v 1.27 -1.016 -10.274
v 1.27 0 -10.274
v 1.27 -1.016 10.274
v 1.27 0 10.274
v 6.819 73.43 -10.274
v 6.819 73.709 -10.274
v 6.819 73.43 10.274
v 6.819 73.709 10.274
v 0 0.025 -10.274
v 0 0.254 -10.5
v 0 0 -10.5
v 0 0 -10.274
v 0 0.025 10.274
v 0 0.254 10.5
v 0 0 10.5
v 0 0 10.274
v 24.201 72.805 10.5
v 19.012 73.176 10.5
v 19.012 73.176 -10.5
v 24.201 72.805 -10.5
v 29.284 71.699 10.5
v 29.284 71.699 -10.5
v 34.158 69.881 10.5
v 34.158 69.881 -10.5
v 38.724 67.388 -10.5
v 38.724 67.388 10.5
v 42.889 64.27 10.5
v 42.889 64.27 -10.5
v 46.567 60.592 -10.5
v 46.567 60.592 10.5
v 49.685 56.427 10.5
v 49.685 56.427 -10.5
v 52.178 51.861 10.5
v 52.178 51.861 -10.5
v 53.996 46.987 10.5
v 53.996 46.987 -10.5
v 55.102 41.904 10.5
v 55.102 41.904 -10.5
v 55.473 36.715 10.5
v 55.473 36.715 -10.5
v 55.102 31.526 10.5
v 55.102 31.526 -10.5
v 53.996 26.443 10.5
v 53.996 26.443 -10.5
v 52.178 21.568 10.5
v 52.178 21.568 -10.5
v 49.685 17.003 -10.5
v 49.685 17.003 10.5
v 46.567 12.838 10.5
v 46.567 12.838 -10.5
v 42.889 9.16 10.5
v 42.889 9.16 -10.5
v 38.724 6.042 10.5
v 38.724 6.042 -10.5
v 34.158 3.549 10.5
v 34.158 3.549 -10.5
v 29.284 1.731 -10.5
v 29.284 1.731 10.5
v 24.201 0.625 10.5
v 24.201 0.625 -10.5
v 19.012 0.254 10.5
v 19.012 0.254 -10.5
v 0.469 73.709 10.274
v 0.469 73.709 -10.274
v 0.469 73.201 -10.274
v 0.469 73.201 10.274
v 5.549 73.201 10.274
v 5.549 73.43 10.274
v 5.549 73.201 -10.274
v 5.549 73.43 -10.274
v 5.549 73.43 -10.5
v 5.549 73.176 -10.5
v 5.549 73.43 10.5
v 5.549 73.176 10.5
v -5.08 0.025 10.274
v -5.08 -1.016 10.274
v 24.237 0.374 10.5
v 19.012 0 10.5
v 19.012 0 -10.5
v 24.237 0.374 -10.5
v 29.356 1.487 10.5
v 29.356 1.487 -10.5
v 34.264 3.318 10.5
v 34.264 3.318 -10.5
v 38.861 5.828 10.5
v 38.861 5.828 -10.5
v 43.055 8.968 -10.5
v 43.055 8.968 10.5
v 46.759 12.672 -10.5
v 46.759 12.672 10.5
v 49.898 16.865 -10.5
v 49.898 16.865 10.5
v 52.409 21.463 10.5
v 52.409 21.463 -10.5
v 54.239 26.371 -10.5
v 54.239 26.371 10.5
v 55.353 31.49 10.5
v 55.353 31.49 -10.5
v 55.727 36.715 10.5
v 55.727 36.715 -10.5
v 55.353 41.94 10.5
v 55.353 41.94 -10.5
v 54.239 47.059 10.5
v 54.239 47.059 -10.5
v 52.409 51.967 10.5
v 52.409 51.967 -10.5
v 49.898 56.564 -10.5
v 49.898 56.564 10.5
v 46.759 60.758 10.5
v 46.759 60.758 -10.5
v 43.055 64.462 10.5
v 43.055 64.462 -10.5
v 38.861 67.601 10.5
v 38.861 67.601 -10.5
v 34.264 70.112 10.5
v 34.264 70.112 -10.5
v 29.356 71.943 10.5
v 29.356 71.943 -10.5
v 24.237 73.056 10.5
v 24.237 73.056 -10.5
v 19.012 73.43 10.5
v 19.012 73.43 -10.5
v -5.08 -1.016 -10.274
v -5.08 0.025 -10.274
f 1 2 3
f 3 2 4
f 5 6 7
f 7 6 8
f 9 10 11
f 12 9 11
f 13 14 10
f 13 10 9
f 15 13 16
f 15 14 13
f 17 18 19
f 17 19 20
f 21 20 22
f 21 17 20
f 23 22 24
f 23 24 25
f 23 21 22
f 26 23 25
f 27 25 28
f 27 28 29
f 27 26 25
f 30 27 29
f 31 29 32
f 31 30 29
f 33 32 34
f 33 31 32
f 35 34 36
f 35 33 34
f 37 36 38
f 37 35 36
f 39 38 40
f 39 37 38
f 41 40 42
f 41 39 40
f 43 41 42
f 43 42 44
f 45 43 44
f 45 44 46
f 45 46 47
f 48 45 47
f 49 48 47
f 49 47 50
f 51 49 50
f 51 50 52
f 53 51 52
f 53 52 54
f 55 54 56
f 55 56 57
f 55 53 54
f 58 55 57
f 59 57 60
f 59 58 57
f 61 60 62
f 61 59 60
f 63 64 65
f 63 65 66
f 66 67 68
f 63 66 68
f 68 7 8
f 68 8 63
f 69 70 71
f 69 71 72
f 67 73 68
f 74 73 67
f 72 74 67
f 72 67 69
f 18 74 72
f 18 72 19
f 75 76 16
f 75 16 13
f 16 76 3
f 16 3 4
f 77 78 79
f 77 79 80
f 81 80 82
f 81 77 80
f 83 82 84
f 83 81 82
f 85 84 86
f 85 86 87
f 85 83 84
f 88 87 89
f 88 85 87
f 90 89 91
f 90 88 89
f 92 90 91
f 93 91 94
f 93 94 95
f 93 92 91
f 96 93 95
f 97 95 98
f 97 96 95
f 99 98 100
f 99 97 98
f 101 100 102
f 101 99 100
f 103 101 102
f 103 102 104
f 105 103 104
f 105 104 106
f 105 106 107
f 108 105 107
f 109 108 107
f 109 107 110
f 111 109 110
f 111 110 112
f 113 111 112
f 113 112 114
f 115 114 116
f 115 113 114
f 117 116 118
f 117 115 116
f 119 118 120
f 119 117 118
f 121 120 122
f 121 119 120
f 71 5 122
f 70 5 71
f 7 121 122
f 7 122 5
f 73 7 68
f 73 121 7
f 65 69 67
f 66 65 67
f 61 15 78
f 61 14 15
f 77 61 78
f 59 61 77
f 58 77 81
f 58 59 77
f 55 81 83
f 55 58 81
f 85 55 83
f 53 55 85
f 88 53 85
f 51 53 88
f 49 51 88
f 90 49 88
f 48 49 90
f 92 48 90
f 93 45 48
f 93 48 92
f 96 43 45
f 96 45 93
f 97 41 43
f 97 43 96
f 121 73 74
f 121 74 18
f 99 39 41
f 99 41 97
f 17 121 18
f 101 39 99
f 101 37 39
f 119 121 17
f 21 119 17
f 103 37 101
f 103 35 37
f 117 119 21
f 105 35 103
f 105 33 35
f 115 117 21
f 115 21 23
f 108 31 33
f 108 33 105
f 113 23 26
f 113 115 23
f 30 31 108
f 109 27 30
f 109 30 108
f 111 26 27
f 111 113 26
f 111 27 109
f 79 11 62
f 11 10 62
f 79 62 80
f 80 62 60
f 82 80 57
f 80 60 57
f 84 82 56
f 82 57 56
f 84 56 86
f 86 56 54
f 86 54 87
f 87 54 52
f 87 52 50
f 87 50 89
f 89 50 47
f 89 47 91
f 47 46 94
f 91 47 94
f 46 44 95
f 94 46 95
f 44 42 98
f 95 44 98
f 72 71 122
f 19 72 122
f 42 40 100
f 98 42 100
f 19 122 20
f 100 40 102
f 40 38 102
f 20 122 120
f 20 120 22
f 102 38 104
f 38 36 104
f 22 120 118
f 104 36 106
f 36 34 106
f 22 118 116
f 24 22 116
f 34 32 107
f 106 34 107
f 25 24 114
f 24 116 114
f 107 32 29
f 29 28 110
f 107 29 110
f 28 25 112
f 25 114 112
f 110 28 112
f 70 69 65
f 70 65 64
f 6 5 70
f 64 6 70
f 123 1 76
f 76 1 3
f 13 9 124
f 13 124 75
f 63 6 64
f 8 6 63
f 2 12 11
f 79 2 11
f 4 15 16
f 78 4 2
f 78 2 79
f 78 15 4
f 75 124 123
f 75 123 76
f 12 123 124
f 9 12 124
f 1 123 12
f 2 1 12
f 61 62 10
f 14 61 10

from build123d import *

# Parameters (mm, degrees)
BOSS_EXTRUDE1_DEPTH      = 10.5
BOSS_EXTRUDE2_DEPTH      = 5.08
BOSS_EXTRUDE2_DEPTH_BACK = 1.27
SKETCH3_W                = 20.5486
SKETCH3_H                = 1.0414
BOSS_EXTRUDE3_DEPTH      = 5.08
BOSS_EXTRUDE3_DEPTH_BACK = 1.27
SKETCH4_W                = 20.5486
SKETCH4_H                = 0.508


with BuildPart() as part:
    # Sketch1 → Boss-Extrude1 (new, symmetric)
    with BuildSketch(Plane.XY):
        with BuildLine():
            Line((0, 0), (19.01175011, 0))
            ThreePointArc((19.01175011, 0), (55.726625118, 36.714875008), (19.01175011, 73.429750016))
            Line((19.01175011, 73.429750016), (5.549000018, 73.429750016))
            Line((5.549000018, 73.429750016), (5.549000018, 73.175750016))
            Line((5.549000018, 73.175750016), (19.01175011, 73.175750016))
            ThreePointArc((19.01175011, 73.175750016), (55.472625118, 36.714875008), (19.01175011, 0.254))
            Line((19.01175011, 0.254), (0, 0.254))
            Line((0, 0.254), (0, 0))
        make_face()
    extrude(amount=BOSS_EXTRUDE1_DEPTH, both=True)

    # Sketch3 → Boss-Extrude2 (add, two sides: drawn at the far end of the back side and taken through both)
    with BuildSketch(Plane.ZY.offset(-BOSS_EXTRUDE2_DEPTH_BACK)):
        with Locations((0, -0.4953)):
            Rectangle(SKETCH3_W, SKETCH3_H)
    extrude(amount=BOSS_EXTRUDE2_DEPTH + BOSS_EXTRUDE2_DEPTH_BACK)

    # Sketch4 → Boss-Extrude3 (add, two sides: drawn at the far end of the back side and taken through both)
    with BuildSketch(Plane.ZY.offset(-5.549000018).offset(-BOSS_EXTRUDE3_DEPTH_BACK)):
        with Locations((0, 73.455150016)):
            Rectangle(SKETCH4_W, SKETCH4_H)
    extrude(amount=BOSS_EXTRUDE3_DEPTH + BOSS_EXTRUDE3_DEPTH_BACK)


solid = part.part
